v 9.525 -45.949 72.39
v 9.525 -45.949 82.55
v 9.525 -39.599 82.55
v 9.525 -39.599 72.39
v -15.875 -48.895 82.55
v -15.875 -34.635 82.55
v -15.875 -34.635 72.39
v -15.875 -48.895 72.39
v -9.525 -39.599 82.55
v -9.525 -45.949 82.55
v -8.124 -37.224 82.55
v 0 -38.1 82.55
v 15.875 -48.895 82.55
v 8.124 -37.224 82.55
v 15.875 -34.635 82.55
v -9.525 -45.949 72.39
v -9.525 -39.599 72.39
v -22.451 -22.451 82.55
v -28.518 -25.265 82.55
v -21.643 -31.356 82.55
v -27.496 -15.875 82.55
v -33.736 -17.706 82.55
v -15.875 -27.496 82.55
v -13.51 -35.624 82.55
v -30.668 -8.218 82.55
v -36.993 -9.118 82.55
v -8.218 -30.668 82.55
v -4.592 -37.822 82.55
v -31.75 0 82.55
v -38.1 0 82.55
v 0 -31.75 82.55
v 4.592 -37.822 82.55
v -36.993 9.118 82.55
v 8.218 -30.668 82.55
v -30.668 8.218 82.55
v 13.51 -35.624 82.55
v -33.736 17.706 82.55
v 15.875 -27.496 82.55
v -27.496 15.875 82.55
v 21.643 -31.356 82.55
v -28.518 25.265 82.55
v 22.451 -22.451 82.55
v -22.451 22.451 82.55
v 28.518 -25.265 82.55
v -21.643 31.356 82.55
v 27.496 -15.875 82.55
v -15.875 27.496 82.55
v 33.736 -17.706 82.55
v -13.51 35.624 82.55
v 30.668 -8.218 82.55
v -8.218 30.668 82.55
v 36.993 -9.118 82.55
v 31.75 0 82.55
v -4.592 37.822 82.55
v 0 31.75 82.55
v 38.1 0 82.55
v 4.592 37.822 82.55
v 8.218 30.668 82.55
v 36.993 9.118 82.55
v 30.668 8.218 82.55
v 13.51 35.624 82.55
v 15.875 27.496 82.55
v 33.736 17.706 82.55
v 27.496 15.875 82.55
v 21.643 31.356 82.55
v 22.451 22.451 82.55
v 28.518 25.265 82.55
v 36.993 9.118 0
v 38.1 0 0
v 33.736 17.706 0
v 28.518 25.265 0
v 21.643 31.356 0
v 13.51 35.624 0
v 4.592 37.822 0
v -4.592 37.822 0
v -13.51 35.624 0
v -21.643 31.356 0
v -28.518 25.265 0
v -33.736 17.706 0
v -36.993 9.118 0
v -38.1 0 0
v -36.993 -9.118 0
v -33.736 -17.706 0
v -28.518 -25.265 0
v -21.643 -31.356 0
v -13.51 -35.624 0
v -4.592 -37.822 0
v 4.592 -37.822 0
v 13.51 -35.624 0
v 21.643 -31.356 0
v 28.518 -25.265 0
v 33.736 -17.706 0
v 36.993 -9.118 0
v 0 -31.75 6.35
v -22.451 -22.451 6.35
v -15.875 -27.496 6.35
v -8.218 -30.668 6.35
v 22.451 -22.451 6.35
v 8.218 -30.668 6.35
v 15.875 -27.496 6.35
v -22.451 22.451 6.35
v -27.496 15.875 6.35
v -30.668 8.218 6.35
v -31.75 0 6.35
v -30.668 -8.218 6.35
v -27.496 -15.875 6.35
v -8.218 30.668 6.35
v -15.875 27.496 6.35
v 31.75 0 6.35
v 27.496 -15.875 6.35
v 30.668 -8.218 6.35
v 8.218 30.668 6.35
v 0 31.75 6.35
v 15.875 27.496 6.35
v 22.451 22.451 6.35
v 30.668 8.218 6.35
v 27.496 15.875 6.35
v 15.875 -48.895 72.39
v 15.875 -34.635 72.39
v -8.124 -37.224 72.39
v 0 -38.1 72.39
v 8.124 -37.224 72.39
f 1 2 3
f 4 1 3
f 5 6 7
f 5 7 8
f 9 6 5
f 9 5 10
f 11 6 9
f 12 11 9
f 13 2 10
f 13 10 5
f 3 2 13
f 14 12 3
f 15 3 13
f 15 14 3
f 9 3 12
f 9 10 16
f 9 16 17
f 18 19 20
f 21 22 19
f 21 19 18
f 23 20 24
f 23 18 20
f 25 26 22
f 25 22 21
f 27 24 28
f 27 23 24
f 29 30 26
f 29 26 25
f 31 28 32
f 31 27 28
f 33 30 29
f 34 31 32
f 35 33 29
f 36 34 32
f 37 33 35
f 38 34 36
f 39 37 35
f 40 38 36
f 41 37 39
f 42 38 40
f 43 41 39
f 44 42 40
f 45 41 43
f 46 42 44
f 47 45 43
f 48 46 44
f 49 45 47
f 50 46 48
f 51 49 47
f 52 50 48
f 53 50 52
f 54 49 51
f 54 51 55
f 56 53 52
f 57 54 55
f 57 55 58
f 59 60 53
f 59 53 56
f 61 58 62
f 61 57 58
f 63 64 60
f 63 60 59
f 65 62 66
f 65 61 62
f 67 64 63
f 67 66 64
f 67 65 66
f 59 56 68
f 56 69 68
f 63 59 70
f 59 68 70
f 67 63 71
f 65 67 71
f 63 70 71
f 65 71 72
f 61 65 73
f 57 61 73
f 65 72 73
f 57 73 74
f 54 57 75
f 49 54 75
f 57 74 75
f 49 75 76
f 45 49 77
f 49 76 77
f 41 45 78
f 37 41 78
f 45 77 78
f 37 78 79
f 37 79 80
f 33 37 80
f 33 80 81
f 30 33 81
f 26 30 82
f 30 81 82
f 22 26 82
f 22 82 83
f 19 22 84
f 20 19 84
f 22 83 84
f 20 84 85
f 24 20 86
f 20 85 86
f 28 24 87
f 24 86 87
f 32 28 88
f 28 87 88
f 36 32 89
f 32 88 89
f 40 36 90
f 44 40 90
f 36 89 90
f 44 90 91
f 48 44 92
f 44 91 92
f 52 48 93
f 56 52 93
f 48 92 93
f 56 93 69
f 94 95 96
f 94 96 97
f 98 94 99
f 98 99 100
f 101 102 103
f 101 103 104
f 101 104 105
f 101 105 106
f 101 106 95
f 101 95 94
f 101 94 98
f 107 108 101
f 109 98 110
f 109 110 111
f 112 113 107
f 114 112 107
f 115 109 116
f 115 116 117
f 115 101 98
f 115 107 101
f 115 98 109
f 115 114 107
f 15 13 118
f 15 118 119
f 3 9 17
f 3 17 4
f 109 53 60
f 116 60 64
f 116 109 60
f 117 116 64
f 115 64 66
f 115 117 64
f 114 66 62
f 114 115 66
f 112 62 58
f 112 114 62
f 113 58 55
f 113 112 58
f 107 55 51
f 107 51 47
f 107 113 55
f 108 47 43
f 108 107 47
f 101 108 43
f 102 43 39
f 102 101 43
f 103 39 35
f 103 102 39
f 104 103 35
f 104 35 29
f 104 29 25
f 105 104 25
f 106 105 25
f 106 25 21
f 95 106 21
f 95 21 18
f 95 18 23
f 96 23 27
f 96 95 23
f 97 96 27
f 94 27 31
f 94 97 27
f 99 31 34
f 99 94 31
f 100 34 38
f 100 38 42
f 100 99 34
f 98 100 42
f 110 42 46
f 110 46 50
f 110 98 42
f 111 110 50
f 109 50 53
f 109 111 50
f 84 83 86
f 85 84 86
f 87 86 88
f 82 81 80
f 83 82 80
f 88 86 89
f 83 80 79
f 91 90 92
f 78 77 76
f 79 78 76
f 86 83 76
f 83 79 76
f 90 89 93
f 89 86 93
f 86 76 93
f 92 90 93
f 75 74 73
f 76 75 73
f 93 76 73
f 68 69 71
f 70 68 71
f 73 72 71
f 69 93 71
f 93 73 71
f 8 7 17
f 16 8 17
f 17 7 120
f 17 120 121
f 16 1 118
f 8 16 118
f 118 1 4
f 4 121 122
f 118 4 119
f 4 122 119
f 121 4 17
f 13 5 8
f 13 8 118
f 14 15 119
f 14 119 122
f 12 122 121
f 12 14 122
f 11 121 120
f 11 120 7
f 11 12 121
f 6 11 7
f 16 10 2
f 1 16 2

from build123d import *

# Parameters (mm, degrees)
F0_R     = 38.1
F1_DEPTH = 6.35
F2_R     = 38.1
F2_R_2   = 31.75
F3_DEPTH = 76.2
F4_W     = 19.05
F4_H     = 6.35
F5_DEPTH = 10.16


with BuildPart() as f1:
    # F0 (on Top) → F1 (new body)
    with BuildSketch(Plane.XY):
        Circle(F0_R)
    extrude(amount=F1_DEPTH)

    # F2 (on face) → F3 (join)
    with BuildSketch(Plane.XY.offset(6.35)):
        Circle(F2_R)
        Circle(F2_R_2, mode=Mode.SUBTRACT)
    extrude(amount=F3_DEPTH)


with BuildPart() as f5:
    # F4 (on face) → F5 (new body)
    with BuildSketch(Plane.XY.offset(82.55)):
        with BuildLine():
            Line((-15.875, -48.895), (15.875, -48.895))
            Line((15.875, -48.895), (15.875, -34.635161))
            ThreePointArc((15.875, -34.635161), (0, -38.1), (-15.875, -34.635161))
            Line((-15.875, -34.635161), (-15.875, -48.895))
        make_face()
        with Locations((0, -42.773783)):
            Rectangle(F4_W, F4_H, mode=Mode.SUBTRACT)
    extrude(amount=-F5_DEPTH)


solid = Compound([f1.part, f5.part])
